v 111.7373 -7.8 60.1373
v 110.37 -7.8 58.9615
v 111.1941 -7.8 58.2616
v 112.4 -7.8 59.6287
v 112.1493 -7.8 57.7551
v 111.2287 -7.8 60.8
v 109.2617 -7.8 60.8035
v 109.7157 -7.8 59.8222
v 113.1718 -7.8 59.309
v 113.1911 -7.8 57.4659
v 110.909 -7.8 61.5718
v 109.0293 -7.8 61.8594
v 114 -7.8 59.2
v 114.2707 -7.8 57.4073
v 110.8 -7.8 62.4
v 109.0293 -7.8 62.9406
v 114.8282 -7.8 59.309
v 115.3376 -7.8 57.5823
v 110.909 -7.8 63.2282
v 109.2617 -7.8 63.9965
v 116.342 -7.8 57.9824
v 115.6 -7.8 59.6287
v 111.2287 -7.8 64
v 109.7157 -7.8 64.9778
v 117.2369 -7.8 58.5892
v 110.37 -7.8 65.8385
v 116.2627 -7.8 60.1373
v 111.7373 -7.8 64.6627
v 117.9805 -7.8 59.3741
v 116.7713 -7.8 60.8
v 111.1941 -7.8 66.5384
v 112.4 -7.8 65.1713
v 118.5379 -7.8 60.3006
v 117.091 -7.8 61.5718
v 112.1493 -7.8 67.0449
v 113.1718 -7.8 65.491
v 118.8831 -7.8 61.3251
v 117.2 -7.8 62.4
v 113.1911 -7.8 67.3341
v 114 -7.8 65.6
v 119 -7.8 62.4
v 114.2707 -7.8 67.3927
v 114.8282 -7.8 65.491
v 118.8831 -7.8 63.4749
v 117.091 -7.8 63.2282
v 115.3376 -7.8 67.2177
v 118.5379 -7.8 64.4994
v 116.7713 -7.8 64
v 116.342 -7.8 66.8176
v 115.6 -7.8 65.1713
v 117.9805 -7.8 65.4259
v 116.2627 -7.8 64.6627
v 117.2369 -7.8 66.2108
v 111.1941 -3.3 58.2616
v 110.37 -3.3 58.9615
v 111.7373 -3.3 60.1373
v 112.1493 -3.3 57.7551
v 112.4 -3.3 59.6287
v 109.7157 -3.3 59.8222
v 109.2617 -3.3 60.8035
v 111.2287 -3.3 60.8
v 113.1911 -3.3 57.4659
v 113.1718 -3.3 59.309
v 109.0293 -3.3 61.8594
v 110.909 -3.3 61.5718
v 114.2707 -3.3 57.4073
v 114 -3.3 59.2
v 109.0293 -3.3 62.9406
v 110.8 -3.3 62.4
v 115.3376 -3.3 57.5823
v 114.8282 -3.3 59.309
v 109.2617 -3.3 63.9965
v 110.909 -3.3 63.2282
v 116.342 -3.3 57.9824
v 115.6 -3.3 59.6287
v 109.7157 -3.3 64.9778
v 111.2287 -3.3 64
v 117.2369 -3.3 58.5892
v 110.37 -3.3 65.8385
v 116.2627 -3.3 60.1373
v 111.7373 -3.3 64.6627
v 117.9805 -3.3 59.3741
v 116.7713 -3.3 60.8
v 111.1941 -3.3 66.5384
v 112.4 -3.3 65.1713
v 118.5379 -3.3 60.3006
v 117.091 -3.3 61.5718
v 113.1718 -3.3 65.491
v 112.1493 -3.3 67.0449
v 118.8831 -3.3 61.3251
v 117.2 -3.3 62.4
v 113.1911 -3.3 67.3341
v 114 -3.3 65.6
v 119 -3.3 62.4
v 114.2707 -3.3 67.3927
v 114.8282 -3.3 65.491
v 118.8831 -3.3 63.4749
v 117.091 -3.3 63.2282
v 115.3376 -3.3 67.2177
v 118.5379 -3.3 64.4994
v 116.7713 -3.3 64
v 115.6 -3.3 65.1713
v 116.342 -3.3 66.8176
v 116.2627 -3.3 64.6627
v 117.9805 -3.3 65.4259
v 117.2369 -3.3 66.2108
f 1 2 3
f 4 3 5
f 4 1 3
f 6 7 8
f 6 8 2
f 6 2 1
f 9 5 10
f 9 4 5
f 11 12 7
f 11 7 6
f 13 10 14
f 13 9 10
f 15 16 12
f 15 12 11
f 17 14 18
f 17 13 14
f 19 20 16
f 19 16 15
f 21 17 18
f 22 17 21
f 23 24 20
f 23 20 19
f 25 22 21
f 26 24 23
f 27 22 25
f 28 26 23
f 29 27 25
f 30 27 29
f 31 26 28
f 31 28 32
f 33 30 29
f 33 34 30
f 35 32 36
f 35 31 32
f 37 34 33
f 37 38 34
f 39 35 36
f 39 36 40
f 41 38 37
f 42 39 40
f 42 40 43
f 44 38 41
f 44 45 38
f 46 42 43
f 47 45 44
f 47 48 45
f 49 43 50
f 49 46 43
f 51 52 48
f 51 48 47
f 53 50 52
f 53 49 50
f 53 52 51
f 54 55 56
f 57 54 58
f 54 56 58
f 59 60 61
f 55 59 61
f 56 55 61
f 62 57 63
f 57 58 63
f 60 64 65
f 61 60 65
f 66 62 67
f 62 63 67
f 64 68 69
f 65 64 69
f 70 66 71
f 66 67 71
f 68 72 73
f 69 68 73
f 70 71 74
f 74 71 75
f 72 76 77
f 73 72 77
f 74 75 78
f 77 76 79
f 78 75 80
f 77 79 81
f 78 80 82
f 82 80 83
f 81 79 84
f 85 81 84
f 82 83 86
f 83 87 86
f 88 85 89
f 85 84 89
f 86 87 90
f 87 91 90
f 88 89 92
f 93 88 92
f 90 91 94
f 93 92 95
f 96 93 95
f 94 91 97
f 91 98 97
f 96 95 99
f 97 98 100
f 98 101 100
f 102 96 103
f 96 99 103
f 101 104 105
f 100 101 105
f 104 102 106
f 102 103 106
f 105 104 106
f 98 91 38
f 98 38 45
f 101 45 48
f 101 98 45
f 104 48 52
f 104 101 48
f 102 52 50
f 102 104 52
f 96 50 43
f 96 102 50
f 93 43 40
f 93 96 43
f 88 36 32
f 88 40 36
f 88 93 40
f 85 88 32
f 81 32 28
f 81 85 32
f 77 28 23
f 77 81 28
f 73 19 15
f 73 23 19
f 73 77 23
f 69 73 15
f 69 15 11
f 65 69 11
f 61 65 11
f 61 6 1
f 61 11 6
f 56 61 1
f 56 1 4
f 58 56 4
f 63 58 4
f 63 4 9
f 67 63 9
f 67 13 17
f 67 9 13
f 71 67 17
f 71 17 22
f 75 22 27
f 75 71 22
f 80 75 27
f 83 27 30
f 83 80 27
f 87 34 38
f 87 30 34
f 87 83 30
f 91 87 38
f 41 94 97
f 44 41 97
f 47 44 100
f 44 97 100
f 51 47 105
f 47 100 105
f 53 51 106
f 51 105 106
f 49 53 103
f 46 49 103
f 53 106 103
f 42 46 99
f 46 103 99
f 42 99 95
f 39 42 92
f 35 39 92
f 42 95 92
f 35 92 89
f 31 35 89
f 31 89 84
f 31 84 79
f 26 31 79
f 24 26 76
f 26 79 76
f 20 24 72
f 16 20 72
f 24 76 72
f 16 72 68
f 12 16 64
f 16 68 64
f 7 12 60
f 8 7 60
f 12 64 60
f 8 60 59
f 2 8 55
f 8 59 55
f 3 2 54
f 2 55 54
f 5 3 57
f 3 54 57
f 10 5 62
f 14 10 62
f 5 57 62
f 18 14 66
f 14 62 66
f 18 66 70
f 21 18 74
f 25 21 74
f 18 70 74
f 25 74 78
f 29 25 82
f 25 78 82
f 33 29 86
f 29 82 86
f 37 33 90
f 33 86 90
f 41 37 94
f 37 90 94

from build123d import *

# Parameters (mm, degrees)
CYLINDER233_R          = 3.2
CYLINDER233_DEPTH      = 16
CYLINDER_R             = 5
CYLINDER_DEPTH         = 4.5
CUT277_PLACEMENT_ANGLE = 90


with BuildPart() as cylinder233:
    # Cylinder233 → Cylinder233 (new body)
    with BuildSketch(Plane.XY.offset(-3)):
        Circle(CYLINDER233_R)
    extrude(amount=CYLINDER233_DEPTH)


with BuildPart() as cut277:
    # Cylinder → Cylinder (new body)
    with BuildSketch(Plane.XY):
        Circle(CYLINDER_R)
    extrude(amount=CYLINDER_DEPTH)

    # Cut277: cut Cylinder233
    add(cylinder233.part, mode=Mode.SUBTRACT)


with BuildPart() as cut277_1:
    # Cut277 placement: moved
    add(cut277.part.moved(Location((114, -3.3, 62.4))).rotate(Axis((114, -3.3, 62.4), (1, 0, 0)), CUT277_PLACEMENT_ANGLE))


solid = cut277_1.part
